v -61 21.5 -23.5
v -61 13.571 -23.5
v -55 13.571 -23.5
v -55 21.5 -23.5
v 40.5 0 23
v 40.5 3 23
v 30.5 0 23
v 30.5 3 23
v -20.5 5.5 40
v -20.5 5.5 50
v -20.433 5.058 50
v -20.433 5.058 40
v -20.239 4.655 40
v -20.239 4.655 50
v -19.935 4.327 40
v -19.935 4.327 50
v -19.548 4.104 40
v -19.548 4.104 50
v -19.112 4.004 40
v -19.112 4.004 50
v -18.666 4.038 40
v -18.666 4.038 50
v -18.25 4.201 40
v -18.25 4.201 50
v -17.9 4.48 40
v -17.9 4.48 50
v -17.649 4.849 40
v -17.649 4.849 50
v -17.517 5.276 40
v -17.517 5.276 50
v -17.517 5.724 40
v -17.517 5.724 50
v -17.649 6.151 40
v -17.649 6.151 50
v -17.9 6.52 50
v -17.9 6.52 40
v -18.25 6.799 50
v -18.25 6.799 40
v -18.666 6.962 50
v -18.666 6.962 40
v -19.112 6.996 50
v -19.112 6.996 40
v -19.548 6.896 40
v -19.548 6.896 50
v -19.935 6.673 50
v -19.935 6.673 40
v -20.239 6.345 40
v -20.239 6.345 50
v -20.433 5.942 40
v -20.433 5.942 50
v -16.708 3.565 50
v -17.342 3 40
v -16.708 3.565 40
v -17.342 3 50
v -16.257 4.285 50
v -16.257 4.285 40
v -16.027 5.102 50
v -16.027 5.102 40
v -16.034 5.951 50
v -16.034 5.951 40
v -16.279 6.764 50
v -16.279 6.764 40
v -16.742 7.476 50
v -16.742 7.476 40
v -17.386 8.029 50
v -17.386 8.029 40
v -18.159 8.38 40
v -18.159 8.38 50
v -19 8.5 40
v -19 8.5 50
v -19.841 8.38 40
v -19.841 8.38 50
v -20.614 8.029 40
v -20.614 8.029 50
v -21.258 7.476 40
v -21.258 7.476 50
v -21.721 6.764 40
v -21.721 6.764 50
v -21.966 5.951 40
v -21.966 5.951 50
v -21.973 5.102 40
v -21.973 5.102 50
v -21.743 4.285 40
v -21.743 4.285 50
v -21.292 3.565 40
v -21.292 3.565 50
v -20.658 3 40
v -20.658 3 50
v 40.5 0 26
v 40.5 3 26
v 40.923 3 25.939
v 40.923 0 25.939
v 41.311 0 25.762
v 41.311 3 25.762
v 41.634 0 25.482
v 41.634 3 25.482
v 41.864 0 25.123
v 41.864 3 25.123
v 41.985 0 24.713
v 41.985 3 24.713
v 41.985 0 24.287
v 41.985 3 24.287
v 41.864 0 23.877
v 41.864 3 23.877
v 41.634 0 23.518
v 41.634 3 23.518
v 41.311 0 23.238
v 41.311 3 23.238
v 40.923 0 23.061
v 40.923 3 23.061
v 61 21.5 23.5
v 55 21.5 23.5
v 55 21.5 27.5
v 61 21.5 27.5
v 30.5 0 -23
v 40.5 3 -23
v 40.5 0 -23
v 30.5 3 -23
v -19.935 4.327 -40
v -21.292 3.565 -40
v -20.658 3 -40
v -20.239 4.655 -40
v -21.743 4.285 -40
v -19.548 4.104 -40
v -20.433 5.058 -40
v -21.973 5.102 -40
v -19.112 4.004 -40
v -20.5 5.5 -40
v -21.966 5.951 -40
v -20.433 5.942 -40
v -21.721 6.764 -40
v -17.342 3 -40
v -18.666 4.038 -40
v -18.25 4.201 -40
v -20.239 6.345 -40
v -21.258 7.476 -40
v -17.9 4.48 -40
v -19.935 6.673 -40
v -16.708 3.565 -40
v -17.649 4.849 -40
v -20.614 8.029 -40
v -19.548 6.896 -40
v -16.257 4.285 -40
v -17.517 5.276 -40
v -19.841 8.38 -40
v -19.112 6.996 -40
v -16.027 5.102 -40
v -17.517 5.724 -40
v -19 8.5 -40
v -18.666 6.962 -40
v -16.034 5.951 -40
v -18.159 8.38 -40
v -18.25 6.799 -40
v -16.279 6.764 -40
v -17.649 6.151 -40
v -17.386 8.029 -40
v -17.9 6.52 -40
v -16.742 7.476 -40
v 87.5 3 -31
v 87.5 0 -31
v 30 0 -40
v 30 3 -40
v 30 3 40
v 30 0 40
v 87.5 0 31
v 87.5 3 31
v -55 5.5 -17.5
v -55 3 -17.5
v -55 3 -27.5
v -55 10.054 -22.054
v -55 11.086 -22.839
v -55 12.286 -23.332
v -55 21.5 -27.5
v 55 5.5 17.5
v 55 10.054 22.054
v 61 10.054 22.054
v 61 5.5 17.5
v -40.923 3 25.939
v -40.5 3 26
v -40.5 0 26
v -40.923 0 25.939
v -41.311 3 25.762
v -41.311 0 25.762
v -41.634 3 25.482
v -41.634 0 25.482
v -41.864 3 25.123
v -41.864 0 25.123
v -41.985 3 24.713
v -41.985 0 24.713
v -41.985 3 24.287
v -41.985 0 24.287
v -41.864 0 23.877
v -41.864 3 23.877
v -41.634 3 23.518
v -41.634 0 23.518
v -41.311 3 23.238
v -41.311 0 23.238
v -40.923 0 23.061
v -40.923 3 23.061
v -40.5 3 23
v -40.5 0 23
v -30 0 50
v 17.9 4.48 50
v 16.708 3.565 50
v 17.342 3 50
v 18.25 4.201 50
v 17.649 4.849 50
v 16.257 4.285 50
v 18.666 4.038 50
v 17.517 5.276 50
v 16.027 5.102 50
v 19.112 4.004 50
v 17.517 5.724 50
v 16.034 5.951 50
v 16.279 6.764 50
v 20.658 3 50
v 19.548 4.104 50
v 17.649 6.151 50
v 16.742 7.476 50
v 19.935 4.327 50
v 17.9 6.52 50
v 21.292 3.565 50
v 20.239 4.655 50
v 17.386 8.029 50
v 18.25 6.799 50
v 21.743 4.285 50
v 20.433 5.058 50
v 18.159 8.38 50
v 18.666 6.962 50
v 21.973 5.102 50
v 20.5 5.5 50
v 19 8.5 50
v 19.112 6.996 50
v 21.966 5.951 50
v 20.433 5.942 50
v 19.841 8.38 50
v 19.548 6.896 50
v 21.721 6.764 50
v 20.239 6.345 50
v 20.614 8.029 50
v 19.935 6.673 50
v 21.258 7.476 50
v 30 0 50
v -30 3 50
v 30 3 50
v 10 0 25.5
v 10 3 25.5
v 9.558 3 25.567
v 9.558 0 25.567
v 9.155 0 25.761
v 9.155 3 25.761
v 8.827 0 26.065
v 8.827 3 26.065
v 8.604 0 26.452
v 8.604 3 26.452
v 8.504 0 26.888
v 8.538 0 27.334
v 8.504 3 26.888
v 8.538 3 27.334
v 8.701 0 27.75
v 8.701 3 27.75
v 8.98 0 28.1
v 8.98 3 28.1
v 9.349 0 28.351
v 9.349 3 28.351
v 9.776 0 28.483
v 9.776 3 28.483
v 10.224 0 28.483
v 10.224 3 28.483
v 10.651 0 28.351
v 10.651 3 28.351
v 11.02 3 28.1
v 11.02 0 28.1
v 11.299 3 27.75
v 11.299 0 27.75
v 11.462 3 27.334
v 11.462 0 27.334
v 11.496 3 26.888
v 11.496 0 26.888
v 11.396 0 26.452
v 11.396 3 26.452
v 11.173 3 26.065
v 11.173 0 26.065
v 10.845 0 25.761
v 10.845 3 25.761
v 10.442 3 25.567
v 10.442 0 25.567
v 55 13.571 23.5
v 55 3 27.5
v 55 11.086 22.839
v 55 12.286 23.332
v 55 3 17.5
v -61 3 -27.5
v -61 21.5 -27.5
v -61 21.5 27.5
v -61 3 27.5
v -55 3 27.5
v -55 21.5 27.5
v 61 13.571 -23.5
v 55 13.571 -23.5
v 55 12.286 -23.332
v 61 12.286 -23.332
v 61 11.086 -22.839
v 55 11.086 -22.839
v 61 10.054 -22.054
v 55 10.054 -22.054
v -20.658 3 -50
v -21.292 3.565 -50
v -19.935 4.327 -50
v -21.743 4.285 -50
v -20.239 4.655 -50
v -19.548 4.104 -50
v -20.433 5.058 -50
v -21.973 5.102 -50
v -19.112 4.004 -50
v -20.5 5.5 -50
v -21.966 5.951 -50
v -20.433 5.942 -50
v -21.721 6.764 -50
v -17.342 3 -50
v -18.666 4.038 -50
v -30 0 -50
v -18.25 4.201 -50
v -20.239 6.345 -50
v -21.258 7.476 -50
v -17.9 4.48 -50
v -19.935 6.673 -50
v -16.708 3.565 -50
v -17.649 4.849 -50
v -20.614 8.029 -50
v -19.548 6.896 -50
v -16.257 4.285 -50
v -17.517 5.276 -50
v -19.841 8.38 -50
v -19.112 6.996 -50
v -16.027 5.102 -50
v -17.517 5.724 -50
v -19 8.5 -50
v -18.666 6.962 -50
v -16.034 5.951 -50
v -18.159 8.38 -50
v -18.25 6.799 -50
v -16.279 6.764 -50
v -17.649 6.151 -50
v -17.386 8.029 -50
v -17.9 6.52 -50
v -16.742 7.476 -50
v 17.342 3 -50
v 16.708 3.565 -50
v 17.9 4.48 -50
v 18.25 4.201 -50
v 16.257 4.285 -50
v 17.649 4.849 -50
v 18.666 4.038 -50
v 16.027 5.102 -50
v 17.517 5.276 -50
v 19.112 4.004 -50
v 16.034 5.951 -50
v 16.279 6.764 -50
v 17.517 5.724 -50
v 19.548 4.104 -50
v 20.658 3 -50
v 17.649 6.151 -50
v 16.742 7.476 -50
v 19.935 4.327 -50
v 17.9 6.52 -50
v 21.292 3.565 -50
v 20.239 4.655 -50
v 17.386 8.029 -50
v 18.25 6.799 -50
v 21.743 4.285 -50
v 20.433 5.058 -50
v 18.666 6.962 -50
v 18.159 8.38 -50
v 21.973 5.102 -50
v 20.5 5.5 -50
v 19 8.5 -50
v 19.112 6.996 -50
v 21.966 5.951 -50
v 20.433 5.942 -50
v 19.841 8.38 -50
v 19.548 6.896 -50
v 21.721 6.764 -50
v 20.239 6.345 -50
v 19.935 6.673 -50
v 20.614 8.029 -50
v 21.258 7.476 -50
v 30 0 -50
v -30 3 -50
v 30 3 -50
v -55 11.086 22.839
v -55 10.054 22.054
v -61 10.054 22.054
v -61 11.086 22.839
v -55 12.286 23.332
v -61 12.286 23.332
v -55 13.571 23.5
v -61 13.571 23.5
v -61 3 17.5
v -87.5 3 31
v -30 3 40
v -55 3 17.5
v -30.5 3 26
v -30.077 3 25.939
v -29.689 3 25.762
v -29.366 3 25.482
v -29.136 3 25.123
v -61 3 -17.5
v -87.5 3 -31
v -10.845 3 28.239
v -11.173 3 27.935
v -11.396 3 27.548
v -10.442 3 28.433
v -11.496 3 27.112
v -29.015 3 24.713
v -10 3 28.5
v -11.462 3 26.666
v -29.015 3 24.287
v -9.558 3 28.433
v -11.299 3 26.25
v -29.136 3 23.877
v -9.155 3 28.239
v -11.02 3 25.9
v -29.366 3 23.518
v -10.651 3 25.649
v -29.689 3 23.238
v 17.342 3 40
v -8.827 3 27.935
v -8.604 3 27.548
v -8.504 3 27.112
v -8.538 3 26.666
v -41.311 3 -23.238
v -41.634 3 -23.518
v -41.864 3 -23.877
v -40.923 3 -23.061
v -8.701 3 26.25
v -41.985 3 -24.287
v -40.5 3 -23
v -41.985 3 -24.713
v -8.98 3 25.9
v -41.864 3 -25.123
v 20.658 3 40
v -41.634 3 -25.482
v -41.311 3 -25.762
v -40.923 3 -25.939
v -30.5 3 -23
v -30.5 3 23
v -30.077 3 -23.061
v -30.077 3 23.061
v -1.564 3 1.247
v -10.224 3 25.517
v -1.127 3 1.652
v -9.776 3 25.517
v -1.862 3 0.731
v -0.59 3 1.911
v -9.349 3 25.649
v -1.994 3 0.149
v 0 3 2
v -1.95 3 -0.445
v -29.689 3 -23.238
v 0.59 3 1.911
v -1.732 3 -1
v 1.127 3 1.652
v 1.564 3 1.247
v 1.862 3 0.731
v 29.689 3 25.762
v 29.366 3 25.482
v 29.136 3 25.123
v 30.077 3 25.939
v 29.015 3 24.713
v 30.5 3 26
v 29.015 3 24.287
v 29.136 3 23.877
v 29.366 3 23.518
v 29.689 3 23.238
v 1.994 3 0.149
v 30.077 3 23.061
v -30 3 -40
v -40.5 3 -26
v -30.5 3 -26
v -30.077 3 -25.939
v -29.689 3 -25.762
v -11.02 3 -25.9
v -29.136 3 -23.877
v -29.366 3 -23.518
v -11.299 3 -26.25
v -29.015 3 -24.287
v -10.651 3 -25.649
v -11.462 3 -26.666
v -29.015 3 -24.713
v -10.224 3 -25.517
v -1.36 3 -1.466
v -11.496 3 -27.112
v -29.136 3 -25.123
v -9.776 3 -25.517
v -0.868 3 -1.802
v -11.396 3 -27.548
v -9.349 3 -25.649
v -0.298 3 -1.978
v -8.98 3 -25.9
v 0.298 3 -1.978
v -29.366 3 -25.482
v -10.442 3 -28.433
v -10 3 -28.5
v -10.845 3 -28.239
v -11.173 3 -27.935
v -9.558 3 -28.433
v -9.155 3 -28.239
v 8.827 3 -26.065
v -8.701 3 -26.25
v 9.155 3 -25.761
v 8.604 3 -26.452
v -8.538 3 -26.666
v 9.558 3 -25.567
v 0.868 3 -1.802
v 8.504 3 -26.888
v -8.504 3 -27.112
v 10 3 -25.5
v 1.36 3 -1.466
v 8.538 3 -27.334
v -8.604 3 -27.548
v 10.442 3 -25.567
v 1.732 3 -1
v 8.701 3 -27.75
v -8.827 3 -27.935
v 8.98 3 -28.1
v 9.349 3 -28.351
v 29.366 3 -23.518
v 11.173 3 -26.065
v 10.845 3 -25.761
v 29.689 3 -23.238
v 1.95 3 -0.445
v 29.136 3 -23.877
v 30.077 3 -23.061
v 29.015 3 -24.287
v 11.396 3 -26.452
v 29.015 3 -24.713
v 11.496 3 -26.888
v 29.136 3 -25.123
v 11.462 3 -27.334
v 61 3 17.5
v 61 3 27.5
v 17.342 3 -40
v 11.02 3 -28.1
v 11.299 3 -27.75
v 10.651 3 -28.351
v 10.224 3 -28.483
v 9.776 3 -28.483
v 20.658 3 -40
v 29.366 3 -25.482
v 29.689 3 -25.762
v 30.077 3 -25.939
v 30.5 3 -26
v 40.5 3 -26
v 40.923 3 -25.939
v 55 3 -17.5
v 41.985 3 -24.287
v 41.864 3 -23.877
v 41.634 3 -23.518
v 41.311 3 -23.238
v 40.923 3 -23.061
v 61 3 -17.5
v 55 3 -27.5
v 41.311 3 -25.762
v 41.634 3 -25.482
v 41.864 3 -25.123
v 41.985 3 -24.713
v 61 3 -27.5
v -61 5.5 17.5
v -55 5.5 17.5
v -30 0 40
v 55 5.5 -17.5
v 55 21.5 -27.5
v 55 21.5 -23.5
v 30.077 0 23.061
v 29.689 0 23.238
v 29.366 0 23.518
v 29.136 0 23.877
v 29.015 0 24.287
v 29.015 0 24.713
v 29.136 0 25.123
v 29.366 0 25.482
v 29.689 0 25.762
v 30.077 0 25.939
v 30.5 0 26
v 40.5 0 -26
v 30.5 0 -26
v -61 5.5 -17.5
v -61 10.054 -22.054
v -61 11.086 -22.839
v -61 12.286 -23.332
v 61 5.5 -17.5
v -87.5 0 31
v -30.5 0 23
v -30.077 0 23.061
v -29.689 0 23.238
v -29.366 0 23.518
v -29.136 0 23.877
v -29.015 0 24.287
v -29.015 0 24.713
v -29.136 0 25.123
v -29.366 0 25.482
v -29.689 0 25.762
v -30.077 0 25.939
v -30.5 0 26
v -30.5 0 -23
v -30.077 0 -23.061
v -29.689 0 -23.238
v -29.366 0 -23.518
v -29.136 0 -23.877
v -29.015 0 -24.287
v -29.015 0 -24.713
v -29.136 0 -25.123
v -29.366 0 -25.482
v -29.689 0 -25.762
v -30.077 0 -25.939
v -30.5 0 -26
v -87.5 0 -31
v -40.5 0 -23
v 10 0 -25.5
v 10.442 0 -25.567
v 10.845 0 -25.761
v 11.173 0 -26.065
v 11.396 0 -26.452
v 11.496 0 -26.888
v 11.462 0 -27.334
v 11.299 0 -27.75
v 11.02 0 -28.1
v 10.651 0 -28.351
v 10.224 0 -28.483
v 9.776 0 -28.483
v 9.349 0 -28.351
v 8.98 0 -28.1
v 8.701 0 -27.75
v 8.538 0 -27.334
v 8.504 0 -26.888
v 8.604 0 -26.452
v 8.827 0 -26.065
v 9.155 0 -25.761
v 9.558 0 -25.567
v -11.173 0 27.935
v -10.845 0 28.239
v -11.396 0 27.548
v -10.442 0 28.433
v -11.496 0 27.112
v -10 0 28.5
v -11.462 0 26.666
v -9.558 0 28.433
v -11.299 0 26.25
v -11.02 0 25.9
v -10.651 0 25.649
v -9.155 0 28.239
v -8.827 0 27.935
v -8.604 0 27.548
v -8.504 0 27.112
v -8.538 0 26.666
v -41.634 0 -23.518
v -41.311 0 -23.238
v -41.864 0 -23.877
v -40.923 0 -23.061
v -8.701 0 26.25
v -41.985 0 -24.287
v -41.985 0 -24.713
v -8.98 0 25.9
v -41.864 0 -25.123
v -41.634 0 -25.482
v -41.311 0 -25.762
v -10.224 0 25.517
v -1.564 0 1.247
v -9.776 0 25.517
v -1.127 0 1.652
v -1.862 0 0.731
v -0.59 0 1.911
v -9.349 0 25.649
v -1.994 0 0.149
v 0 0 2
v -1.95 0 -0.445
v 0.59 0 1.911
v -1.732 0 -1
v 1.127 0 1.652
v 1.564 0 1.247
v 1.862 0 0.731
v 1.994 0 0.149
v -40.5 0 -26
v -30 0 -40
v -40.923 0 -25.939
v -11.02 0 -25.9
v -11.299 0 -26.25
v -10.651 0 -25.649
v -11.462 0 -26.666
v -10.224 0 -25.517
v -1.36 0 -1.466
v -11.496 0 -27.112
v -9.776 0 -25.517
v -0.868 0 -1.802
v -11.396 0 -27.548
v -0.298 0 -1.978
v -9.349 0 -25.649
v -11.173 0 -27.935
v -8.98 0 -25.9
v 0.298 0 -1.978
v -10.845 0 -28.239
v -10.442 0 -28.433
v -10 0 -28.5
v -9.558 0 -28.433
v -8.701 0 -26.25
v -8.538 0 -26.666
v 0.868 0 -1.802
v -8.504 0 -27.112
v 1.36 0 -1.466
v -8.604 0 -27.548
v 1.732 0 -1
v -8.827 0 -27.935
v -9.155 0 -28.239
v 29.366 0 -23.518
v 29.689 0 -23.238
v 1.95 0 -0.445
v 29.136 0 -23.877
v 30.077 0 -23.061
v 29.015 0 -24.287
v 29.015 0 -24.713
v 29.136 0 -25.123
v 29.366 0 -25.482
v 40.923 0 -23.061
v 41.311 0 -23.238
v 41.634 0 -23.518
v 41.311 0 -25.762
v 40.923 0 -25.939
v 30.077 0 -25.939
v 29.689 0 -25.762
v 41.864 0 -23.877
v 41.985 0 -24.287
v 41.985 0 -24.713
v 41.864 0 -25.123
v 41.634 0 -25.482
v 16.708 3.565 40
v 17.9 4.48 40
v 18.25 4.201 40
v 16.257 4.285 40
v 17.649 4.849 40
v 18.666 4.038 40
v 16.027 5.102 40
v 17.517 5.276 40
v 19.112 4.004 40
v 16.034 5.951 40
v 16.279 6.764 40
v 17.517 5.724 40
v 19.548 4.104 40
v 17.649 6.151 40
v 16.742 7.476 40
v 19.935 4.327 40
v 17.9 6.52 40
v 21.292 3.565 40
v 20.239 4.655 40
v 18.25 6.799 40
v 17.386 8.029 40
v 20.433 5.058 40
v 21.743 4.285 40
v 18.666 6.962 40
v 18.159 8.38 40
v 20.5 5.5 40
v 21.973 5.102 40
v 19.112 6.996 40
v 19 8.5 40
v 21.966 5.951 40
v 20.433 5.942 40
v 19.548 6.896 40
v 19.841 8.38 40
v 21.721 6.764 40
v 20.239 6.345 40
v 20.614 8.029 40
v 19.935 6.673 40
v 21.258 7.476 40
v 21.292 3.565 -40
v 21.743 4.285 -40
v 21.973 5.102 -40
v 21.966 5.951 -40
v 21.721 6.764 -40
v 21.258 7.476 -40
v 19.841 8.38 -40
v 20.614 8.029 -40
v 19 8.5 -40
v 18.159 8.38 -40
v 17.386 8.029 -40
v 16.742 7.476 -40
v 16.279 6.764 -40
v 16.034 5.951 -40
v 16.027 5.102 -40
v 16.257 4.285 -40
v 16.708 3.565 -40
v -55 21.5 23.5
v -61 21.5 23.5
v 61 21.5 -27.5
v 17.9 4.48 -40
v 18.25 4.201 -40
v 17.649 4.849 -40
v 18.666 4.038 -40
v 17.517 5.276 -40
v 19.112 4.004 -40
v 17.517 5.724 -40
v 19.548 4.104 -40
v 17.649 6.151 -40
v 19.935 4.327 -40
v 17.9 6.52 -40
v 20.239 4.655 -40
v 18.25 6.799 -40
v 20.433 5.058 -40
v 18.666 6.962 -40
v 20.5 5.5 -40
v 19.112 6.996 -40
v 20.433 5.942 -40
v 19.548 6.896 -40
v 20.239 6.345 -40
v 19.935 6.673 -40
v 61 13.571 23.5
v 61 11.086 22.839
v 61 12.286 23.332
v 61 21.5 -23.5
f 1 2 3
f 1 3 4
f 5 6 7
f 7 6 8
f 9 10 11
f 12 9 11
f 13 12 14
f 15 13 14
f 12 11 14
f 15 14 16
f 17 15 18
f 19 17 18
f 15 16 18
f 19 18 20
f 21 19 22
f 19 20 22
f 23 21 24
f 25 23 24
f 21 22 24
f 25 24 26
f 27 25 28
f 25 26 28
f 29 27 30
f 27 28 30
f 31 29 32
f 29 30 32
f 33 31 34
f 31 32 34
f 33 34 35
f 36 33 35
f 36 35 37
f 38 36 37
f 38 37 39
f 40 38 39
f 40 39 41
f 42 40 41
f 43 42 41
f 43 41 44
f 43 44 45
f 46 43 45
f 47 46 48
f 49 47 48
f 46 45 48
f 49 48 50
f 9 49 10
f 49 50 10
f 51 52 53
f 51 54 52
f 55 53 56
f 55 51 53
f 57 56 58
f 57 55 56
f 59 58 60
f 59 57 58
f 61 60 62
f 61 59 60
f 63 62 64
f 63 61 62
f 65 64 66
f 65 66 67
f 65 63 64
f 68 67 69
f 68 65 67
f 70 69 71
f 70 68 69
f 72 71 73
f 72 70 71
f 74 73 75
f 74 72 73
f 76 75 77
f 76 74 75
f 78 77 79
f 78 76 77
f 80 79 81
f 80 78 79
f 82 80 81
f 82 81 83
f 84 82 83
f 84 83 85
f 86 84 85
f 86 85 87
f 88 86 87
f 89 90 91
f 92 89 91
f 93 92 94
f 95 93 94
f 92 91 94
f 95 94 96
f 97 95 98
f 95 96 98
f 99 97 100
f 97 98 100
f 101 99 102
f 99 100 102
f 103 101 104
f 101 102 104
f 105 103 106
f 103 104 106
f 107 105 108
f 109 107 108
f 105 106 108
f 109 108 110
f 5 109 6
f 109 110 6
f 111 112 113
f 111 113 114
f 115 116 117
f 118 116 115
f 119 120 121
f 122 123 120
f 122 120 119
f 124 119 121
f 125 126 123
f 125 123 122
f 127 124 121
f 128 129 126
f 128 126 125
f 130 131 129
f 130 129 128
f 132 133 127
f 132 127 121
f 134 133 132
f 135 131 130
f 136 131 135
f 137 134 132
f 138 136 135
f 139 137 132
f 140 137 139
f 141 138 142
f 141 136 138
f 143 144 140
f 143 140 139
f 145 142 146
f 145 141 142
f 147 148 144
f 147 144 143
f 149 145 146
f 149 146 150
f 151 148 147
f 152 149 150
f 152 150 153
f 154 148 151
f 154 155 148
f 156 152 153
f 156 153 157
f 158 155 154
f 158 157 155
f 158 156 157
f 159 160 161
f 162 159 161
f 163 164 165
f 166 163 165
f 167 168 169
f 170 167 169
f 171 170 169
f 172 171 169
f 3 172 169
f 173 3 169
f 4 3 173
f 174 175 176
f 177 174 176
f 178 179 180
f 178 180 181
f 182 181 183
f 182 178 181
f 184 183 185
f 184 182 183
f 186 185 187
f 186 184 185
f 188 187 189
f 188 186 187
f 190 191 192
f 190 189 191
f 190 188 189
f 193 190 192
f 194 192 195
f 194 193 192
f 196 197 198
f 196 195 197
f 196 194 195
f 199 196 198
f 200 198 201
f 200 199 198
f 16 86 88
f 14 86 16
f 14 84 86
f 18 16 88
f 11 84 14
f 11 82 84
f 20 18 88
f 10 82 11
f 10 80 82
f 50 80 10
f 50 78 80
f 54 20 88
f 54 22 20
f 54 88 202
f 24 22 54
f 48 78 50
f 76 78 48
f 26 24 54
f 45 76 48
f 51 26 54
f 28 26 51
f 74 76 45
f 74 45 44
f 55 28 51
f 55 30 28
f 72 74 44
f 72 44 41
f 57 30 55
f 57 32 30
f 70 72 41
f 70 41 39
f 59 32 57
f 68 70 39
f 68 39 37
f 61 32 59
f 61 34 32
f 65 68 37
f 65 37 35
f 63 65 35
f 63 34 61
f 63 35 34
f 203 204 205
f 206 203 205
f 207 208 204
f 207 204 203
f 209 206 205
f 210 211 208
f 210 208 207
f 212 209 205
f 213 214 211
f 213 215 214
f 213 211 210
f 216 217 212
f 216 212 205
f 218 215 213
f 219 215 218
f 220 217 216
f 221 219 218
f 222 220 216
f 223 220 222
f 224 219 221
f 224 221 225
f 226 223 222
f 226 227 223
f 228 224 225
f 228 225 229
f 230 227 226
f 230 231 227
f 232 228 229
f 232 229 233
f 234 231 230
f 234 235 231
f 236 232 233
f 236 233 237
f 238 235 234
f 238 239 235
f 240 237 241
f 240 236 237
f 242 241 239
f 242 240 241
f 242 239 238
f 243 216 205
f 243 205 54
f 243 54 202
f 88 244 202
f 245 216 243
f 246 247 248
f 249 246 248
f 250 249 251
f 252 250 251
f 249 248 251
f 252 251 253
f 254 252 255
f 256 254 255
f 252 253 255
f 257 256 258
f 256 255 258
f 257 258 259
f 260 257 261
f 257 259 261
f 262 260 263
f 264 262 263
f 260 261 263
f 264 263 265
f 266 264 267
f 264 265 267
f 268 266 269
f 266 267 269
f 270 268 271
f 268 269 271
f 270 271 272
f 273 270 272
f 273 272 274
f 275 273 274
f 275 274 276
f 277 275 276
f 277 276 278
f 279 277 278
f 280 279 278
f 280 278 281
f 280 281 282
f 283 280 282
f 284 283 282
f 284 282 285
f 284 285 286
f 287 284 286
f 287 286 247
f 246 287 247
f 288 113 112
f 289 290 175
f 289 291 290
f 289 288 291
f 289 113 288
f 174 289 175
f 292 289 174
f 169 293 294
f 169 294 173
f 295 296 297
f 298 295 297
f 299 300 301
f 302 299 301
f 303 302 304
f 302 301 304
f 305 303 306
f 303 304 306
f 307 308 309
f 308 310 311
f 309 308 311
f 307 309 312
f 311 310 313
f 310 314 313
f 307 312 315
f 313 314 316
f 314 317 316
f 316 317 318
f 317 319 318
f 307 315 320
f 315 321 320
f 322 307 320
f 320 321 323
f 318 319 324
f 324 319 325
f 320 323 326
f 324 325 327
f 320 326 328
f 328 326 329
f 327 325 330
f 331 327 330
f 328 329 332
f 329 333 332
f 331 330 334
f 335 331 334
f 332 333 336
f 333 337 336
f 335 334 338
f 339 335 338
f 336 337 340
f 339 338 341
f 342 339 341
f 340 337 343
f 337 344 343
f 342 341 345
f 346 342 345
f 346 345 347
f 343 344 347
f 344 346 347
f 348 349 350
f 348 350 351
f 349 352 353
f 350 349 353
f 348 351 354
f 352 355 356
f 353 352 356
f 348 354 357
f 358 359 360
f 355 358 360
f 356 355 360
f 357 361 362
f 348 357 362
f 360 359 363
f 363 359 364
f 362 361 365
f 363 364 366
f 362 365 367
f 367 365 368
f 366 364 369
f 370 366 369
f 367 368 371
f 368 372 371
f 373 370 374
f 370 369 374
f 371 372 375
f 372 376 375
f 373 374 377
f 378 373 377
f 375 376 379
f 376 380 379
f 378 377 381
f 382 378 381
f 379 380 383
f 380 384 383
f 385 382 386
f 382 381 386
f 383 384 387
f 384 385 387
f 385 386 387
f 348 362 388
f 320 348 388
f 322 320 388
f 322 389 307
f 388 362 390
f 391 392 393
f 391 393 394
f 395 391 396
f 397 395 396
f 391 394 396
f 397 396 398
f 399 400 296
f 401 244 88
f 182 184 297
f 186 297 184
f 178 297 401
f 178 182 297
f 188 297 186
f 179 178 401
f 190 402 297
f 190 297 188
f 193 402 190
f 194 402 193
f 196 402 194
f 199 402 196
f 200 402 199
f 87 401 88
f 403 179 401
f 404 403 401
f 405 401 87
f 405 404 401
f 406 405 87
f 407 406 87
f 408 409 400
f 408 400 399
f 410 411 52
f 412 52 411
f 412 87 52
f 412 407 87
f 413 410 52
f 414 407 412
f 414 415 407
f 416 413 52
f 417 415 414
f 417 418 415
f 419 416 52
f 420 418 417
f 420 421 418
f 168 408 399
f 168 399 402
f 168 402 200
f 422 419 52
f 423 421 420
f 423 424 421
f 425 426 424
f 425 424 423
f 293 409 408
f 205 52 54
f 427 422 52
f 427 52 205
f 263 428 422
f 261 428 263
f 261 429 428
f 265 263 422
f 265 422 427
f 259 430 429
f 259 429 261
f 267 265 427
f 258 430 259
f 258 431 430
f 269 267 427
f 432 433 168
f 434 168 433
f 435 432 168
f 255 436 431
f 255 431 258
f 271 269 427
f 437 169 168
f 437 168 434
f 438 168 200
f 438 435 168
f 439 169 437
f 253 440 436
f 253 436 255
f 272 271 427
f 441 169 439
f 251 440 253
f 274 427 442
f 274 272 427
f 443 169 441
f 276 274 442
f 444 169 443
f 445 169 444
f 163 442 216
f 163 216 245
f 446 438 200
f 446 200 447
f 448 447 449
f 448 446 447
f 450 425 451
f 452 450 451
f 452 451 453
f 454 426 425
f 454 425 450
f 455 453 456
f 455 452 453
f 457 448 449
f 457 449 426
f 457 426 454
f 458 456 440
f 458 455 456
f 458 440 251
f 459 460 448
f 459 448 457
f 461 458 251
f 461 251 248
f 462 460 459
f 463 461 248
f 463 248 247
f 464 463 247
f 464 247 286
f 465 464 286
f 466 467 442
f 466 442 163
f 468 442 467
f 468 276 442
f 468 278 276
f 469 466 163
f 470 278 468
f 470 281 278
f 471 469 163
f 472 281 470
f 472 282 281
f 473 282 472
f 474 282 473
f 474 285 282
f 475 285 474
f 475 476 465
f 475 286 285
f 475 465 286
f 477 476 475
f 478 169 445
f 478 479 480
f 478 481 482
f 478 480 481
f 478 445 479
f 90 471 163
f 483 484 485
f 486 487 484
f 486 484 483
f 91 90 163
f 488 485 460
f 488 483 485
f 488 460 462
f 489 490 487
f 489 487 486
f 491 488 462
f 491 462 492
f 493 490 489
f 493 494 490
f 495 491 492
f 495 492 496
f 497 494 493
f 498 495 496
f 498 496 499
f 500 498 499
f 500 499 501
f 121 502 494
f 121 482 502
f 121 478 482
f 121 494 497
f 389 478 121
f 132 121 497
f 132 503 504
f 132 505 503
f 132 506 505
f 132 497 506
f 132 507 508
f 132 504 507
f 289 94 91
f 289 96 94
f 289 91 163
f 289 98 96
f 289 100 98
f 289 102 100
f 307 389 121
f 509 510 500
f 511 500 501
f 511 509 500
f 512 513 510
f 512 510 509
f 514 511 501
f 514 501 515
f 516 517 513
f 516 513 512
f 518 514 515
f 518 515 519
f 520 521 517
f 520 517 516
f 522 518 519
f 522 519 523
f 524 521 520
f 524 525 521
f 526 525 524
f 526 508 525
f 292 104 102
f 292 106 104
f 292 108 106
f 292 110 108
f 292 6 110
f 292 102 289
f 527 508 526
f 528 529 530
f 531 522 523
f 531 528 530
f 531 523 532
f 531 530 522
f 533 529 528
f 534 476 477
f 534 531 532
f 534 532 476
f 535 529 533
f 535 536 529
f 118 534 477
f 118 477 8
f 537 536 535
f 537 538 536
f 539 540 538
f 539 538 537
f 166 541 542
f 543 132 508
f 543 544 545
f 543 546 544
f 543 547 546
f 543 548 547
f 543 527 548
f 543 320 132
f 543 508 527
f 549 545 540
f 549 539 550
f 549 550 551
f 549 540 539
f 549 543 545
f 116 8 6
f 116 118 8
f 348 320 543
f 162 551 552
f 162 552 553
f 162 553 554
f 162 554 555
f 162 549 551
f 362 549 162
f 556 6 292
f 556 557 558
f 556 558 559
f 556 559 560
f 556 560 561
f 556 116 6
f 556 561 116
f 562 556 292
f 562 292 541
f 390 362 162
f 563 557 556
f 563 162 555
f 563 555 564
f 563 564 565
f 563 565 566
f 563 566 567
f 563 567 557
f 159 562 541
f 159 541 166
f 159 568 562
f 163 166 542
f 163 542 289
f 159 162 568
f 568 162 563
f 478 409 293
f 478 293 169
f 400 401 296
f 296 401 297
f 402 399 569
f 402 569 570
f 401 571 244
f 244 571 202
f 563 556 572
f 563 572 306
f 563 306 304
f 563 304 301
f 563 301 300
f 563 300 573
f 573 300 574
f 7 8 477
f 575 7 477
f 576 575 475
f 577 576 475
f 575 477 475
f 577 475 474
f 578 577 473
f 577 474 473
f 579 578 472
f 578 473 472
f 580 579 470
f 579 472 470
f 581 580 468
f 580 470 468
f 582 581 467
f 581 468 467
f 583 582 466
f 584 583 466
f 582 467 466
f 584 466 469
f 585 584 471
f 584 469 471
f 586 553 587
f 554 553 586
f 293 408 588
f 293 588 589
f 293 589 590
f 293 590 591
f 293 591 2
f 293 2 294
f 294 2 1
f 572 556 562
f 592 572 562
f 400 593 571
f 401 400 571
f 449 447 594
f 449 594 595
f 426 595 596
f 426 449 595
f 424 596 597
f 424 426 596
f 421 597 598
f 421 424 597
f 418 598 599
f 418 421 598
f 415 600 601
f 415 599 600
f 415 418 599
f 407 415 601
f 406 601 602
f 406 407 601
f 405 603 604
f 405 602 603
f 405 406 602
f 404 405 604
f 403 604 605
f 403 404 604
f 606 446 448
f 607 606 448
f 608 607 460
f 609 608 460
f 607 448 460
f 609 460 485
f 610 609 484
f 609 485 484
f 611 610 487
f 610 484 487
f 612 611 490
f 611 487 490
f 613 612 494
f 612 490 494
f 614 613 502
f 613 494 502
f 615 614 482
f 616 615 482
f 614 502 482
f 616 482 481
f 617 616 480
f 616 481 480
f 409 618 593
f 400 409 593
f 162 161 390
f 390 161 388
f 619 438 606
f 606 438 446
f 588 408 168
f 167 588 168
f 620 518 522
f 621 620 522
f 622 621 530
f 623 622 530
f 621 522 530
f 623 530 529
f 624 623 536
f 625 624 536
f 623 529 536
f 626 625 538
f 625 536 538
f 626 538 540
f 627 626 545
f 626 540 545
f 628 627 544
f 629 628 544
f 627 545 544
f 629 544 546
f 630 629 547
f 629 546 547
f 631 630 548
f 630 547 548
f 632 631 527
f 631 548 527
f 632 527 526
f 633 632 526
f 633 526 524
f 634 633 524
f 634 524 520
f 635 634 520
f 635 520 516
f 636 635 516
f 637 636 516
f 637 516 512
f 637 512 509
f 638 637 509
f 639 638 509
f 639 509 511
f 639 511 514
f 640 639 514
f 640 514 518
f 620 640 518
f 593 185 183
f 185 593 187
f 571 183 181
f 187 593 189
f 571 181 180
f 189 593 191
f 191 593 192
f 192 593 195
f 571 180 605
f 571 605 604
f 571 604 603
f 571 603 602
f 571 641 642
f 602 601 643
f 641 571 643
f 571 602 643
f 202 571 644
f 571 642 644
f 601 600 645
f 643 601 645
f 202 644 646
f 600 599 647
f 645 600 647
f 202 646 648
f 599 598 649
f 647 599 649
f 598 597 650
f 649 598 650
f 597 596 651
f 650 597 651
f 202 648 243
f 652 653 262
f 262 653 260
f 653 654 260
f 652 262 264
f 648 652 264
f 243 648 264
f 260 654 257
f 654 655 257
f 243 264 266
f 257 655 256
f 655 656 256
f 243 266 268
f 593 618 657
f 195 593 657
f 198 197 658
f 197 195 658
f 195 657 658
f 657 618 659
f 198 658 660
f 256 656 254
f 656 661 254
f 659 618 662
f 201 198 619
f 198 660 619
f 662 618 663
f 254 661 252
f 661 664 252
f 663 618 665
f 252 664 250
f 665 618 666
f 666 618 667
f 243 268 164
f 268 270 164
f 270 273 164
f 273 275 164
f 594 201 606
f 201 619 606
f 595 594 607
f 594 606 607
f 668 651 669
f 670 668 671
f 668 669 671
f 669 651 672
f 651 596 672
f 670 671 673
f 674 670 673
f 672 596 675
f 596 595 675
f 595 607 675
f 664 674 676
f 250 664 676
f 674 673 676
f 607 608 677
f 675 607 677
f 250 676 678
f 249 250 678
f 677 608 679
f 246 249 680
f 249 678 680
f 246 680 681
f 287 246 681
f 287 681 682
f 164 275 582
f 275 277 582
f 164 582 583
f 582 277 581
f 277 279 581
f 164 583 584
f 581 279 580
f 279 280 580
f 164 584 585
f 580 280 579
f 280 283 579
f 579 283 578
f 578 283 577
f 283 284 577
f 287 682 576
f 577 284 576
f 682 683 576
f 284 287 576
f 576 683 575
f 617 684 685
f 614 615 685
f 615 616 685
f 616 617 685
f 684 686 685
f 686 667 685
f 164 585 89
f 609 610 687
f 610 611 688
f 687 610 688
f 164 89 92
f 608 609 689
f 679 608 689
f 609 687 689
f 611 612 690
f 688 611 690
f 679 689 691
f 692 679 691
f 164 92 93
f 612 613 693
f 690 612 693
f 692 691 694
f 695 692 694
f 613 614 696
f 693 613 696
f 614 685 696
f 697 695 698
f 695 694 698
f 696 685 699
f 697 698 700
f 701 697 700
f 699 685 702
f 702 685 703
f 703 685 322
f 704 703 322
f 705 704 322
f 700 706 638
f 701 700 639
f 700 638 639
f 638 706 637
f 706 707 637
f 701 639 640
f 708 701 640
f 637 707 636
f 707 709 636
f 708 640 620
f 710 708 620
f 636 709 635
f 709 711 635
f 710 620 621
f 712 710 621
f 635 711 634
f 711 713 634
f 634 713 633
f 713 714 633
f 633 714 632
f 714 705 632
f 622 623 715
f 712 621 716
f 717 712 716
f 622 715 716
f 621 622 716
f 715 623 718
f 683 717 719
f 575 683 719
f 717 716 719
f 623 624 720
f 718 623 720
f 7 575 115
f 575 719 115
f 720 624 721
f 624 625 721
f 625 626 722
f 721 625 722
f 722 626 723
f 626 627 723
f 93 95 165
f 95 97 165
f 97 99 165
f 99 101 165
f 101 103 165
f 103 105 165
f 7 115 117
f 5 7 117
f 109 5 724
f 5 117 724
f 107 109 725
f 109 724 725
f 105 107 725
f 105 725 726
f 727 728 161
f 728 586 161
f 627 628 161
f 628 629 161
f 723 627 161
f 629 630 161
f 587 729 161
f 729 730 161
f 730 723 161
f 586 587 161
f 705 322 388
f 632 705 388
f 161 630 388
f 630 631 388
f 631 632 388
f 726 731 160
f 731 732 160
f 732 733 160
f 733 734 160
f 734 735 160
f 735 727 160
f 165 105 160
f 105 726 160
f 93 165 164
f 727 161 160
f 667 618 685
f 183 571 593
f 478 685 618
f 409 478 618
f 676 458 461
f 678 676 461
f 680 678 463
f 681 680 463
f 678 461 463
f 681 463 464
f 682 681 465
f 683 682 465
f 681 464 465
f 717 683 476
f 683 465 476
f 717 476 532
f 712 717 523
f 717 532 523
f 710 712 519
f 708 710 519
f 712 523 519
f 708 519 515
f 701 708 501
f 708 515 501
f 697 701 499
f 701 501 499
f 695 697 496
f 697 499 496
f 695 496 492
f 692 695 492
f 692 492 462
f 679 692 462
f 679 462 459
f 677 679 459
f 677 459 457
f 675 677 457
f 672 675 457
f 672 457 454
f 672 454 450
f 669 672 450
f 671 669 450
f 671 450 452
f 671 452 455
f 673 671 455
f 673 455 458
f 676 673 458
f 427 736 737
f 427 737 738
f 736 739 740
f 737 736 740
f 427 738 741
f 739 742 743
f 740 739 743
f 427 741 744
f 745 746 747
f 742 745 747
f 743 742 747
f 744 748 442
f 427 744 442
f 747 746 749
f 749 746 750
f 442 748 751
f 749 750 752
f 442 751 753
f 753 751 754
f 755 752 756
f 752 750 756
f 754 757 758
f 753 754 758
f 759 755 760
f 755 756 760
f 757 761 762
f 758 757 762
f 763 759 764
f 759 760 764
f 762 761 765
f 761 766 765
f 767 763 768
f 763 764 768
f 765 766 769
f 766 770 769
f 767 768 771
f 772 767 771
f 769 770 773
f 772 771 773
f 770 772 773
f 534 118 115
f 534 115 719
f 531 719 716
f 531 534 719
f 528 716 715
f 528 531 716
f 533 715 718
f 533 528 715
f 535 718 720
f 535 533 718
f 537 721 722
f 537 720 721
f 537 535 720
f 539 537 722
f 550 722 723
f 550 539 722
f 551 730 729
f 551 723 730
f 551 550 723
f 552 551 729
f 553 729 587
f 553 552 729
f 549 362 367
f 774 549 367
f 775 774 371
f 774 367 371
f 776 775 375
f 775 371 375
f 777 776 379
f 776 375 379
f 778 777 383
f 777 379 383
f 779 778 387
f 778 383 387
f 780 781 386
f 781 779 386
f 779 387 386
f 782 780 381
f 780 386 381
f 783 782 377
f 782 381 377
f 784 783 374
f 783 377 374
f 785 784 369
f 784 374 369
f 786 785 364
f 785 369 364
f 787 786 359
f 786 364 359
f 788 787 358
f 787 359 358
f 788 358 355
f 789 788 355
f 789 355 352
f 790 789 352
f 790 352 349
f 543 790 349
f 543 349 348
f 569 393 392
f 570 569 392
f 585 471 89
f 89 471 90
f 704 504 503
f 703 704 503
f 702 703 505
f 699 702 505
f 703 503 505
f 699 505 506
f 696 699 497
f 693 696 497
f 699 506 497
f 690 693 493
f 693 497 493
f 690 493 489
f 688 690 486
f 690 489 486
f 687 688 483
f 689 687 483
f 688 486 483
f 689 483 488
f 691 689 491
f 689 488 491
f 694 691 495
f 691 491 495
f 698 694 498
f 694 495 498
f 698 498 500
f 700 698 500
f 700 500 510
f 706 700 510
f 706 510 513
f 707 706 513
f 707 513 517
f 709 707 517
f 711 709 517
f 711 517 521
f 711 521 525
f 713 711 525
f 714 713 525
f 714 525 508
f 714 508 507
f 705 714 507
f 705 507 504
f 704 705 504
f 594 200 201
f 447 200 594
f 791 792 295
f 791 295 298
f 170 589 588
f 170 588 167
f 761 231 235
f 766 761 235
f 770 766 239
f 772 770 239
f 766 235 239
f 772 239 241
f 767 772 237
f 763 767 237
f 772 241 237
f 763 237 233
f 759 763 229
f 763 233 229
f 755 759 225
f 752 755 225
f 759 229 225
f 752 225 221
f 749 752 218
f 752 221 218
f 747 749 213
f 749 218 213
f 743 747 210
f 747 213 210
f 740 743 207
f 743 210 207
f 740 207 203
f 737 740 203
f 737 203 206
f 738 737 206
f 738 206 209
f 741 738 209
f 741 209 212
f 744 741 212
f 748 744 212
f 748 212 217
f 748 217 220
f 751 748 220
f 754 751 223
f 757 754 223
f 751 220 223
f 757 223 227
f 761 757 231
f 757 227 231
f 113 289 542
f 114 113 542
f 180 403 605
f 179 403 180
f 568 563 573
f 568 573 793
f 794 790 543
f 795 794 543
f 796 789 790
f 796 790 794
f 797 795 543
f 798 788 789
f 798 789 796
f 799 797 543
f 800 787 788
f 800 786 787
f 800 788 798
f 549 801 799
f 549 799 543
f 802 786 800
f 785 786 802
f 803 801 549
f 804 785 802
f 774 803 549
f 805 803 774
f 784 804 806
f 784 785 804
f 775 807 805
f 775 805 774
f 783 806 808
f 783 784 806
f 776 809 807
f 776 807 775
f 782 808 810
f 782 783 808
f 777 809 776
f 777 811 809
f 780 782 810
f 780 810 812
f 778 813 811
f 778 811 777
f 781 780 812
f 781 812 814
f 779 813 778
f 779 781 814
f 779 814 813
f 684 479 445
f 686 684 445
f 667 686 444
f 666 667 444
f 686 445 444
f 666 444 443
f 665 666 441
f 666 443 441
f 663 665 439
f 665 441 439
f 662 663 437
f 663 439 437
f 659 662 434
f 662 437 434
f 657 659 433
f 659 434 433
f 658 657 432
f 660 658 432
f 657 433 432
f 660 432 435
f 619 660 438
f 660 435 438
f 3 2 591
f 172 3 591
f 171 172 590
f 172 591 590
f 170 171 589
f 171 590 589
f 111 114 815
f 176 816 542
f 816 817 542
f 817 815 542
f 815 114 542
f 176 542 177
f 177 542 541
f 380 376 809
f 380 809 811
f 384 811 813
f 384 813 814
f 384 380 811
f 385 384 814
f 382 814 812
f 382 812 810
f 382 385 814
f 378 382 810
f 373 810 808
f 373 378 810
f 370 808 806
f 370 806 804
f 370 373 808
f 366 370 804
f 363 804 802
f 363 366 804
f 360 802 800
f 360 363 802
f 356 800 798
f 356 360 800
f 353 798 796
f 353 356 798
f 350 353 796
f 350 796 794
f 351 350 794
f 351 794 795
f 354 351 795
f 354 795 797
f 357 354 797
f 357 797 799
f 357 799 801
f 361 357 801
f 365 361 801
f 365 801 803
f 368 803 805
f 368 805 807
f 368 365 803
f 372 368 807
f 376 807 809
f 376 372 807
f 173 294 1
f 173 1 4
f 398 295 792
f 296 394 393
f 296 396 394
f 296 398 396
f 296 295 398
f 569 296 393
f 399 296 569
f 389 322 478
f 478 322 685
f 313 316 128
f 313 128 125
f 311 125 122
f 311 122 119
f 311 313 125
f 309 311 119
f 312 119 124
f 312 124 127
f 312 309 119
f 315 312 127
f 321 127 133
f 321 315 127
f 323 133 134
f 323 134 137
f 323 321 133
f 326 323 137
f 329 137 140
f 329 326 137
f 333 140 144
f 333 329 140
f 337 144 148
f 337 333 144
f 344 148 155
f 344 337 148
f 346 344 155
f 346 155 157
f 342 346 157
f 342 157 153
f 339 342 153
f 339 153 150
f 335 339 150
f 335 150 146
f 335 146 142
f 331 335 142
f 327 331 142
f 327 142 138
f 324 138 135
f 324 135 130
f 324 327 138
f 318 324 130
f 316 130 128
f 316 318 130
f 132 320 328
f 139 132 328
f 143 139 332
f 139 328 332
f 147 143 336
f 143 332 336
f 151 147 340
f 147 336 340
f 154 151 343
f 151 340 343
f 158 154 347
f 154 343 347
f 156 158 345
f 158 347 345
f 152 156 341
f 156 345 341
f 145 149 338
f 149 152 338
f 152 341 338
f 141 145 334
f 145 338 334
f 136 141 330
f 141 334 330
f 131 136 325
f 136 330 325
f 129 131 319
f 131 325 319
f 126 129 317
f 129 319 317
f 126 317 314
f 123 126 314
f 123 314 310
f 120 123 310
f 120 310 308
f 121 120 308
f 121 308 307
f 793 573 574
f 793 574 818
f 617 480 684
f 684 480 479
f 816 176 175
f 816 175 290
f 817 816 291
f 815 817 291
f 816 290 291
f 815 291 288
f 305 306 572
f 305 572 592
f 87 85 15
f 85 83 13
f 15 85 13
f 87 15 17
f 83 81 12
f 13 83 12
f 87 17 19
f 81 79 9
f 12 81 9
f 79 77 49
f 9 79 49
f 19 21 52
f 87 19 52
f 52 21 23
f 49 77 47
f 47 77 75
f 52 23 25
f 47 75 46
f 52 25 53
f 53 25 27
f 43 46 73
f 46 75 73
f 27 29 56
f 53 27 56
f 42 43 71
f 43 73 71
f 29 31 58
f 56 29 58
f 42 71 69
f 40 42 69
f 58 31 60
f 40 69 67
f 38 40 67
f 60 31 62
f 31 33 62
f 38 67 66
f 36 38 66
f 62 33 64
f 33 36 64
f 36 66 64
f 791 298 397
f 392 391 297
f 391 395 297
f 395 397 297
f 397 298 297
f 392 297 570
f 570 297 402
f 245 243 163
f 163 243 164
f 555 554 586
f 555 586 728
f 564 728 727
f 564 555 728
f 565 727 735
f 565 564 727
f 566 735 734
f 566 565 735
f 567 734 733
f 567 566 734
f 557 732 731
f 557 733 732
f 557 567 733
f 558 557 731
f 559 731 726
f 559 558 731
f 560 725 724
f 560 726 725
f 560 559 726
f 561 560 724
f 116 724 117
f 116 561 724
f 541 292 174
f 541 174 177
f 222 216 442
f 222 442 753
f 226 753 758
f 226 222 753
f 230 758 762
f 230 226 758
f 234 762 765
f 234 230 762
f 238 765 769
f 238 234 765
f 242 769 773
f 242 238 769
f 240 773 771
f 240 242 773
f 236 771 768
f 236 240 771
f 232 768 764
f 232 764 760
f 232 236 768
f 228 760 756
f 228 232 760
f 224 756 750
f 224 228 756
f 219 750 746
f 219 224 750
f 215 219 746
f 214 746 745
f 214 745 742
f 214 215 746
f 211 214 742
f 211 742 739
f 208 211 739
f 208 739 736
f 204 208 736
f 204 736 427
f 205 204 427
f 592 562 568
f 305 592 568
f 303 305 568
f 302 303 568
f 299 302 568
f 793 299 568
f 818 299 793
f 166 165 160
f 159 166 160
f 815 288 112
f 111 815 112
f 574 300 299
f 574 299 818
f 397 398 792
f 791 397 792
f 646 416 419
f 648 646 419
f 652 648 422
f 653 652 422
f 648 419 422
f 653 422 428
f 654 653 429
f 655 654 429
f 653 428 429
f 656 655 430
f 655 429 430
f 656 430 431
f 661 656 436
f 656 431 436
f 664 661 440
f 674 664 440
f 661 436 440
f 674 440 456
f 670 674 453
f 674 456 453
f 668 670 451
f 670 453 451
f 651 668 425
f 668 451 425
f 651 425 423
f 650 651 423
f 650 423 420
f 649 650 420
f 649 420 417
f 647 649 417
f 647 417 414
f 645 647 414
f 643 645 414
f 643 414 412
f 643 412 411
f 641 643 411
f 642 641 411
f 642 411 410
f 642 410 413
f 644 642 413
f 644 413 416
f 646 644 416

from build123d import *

# Parameters (mm, degrees)
BOSS_EXTRUDE1_DEPTH = 3
SKETCH2_R           = 3
SKETCH2_R_2         = 1.5
BOSS_EXTRUDE2_DEPTH = 10
SKETCH3_R           = 2
SKETCH3_R_2         = 1.5
CUT_EXTRUDE1_DEPTH  = 101.928192295
SKETCH4_W           = 6
SKETCH4_H           = 10
BOSS_EXTRUDE3_DEPTH = 18.5
SKETCH5_W           = 6
SKETCH5_H           = 10
CUT_EXTRUDE2_DEPTH  = 159.159729388
CHAMFER1_SIZE       = 6
FILLET1_START       = -61
FILLET1_DEPTH       = 6
FILLET1_START_2     = 55
FILLET1_2_DEPTH     = 6


with BuildPart() as part:
    # Sketch1 → Boss-Extrude1 (new body)
    with BuildSketch(Plane(origin=(0, 0, 0), x_dir=(1, 0, 0), z_dir=(0, 1, 0))):
        Polygon((30, -50), (30, -40), (30, 40), (30, 50), (-30, 50), (-30, 40), (-30, -40), (-30, -50), align=None)
        Polygon((-87.5, -31), (-30, -40), (-30, 40), (-87.5, 31), align=None)
        Polygon((30, 40), (30, -40), (87.5, -31), (87.5, 31), align=None)
    extrude(amount=BOSS_EXTRUDE1_DEPTH)

    # Sketch2 → Boss-Extrude2 (add)
    # profile 1 of 2: a face of its own
    with BuildSketch(Plane.XY.offset(50)):
        with Locations((19, 5.5)):
            Circle(SKETCH2_R)
        with Locations((19, 5.5)):
            Circle(SKETCH2_R_2, mode=Mode.SUBTRACT)
    # profile 2 of 2: a face of its own
    with BuildSketch(Plane.XY.offset(50)):
        with Locations((-19, 5.5)):
            Circle(SKETCH2_R)
        with Locations(Location((-19, 5.5, 0), (0, 0, 180))):
            Circle(SKETCH2_R_2, mode=Mode.SUBTRACT)
    boss_extrude2 = extrude(amount=-BOSS_EXTRUDE2_DEPTH)

    # Mirror1: Boss-Extrude2 across plane
    add(boss_extrude2.mirror(Plane.XY))

    # Sketch3 → Cut-Extrude1 (cut, through all)
    with BuildSketch(Plane(origin=(0, 3, 0), x_dir=(1, 0, 0), z_dir=(0, 1, 0))):
        with Locations(Location((0, 0, 0), (0, 0, 270))):
            Circle(SKETCH3_R)
        with Locations(Location((10, 27, 0), (0, 0, 270))):
            Circle(SKETCH3_R_2)
        with Locations(Location((-10, 27, 0), (0, 0, 90))):
            Circle(SKETCH3_R_2)
        with Locations(Location((10, -27, 0), (0, 0, 90))):
            Circle(SKETCH3_R_2)
        with Locations(Location((-10, -27, 0), (0, 0, 270))):
            Circle(SKETCH3_R_2)
        with BuildLine():
            Line((30.5, 26), (40.5, 26))
            ThreePointArc((40.5, 26), (42, 24.5), (40.5, 23))
            Line((40.5, 23), (30.5, 23))
            ThreePointArc((30.5, 23), (29, 24.5), (30.5, 26))
        make_face()
        with BuildLine():
            Line((-30.5, 26), (-40.5, 26))
            ThreePointArc((-40.5, 26), (-42, 24.5), (-40.5, 23))
            Line((-40.5, 23), (-30.5, 23))
            ThreePointArc((-30.5, 23), (-29, 24.5), (-30.5, 26))
        make_face()
        with BuildLine():
            Line((30.5, -26), (40.5, -26))
            ThreePointArc((40.5, -26), (42, -24.5), (40.5, -23))
            Line((40.5, -23), (30.5, -23))
            ThreePointArc((30.5, -23), (29, -24.5), (30.5, -26))
        make_face()
        with BuildLine():
            Line((-30.5, -26), (-40.5, -26))
            ThreePointArc((-40.5, -26), (-42, -24.5), (-40.5, -23))
            Line((-40.5, -23), (-30.5, -23))
            ThreePointArc((-30.5, -23), (-29, -24.5), (-30.5, -26))
        make_face()
    extrude(amount=-CUT_EXTRUDE1_DEPTH, mode=Mode.SUBTRACT)

    # Sketch4 → Boss-Extrude3 (add)
    with BuildSketch(Plane(origin=(0, 3, 0), x_dir=(1, 0, 0), z_dir=(0, 1, 0))):
        with Locations((58, 22.5)):
            Rectangle(SKETCH4_W, SKETCH4_H)
        with Locations((58, -22.5)):
            Rectangle(SKETCH4_W, SKETCH4_H)
        with Locations((-58, -22.5)):
            Rectangle(SKETCH4_W, SKETCH4_H)
        with Locations((-58, 22.5)):
            Rectangle(SKETCH4_W, SKETCH4_H)
    extrude(amount=BOSS_EXTRUDE3_DEPTH)

    # Sketch5 → Cut-Extrude2 (cut, through all)
    with BuildSketch(Plane.ZY.offset(61)):
        with Locations((-20.5, 16.5)):
            Rectangle(SKETCH5_W, SKETCH5_H)
        with Locations((20.5, 16.5)):
            Rectangle(SKETCH5_W, SKETCH5_H)
    extrude(amount=-CUT_EXTRUDE2_DEPTH, mode=Mode.SUBTRACT)

    # Chamfer1
    chamfer1_edges = [part.edges().sort_by_distance(p)[0] for p in [
        (58, 11.5, 17.5),
        (-58, 11.5, 17.5),
        (58, 11.5, -17.5),
        (-58, 11.5, -17.5),
    ]]
    chamfer(chamfer1_edges, length=CHAMFER1_SIZE - 0.0001)  # a hair under: the kernel refuses the full size

    # Fillet1: read off the stored shape, not the designer's step
    # Fillet1 outline → Fillet1 (add)
    with BuildSketch(Plane.YZ.offset(FILLET1_START)):
        with BuildLine():
            ThreePointArc((13.571067812, -23.5), (11.65765065, -23.119397663), (10.035533906, -22.035533906))
            Line((10.035533906, -22.035533906), (11.5, -23.5))
            Line((11.5, -23.5), (13.571067812, -23.5))
        make_face()
        with BuildLine():
            ThreePointArc((10.035533906, 22.035533906), (11.65765065, 23.119397663), (13.571067812, 23.5))
            Line((13.571067812, 23.5), (11.5, 23.5))
            Line((11.5, 23.5), (10.035533906, 22.035533906))
        make_face()
    extrude(amount=FILLET1_DEPTH)

    # Fillet1 2 outline → Fillet1 2 (add)
    with BuildSketch(Plane.YZ.offset(FILLET1_START_2)):
        with BuildLine():
            ThreePointArc((13.571067812, -23.5), (11.65765065, -23.119397663), (10.035533906, -22.035533906))
            Line((10.035533906, -22.035533906), (11.5, -23.5))
            Line((11.5, -23.5), (13.571067812, -23.5))
        make_face()
        with BuildLine():
            ThreePointArc((10.035533906, 22.035533906), (11.65765065, 23.119397663), (13.571067812, 23.5))
            Line((13.571067812, 23.5), (11.5, 23.5))
            Line((11.5, 23.5), (10.035533906, 22.035533906))
        make_face()
    extrude(amount=FILLET1_2_DEPTH)


solid = part.part
